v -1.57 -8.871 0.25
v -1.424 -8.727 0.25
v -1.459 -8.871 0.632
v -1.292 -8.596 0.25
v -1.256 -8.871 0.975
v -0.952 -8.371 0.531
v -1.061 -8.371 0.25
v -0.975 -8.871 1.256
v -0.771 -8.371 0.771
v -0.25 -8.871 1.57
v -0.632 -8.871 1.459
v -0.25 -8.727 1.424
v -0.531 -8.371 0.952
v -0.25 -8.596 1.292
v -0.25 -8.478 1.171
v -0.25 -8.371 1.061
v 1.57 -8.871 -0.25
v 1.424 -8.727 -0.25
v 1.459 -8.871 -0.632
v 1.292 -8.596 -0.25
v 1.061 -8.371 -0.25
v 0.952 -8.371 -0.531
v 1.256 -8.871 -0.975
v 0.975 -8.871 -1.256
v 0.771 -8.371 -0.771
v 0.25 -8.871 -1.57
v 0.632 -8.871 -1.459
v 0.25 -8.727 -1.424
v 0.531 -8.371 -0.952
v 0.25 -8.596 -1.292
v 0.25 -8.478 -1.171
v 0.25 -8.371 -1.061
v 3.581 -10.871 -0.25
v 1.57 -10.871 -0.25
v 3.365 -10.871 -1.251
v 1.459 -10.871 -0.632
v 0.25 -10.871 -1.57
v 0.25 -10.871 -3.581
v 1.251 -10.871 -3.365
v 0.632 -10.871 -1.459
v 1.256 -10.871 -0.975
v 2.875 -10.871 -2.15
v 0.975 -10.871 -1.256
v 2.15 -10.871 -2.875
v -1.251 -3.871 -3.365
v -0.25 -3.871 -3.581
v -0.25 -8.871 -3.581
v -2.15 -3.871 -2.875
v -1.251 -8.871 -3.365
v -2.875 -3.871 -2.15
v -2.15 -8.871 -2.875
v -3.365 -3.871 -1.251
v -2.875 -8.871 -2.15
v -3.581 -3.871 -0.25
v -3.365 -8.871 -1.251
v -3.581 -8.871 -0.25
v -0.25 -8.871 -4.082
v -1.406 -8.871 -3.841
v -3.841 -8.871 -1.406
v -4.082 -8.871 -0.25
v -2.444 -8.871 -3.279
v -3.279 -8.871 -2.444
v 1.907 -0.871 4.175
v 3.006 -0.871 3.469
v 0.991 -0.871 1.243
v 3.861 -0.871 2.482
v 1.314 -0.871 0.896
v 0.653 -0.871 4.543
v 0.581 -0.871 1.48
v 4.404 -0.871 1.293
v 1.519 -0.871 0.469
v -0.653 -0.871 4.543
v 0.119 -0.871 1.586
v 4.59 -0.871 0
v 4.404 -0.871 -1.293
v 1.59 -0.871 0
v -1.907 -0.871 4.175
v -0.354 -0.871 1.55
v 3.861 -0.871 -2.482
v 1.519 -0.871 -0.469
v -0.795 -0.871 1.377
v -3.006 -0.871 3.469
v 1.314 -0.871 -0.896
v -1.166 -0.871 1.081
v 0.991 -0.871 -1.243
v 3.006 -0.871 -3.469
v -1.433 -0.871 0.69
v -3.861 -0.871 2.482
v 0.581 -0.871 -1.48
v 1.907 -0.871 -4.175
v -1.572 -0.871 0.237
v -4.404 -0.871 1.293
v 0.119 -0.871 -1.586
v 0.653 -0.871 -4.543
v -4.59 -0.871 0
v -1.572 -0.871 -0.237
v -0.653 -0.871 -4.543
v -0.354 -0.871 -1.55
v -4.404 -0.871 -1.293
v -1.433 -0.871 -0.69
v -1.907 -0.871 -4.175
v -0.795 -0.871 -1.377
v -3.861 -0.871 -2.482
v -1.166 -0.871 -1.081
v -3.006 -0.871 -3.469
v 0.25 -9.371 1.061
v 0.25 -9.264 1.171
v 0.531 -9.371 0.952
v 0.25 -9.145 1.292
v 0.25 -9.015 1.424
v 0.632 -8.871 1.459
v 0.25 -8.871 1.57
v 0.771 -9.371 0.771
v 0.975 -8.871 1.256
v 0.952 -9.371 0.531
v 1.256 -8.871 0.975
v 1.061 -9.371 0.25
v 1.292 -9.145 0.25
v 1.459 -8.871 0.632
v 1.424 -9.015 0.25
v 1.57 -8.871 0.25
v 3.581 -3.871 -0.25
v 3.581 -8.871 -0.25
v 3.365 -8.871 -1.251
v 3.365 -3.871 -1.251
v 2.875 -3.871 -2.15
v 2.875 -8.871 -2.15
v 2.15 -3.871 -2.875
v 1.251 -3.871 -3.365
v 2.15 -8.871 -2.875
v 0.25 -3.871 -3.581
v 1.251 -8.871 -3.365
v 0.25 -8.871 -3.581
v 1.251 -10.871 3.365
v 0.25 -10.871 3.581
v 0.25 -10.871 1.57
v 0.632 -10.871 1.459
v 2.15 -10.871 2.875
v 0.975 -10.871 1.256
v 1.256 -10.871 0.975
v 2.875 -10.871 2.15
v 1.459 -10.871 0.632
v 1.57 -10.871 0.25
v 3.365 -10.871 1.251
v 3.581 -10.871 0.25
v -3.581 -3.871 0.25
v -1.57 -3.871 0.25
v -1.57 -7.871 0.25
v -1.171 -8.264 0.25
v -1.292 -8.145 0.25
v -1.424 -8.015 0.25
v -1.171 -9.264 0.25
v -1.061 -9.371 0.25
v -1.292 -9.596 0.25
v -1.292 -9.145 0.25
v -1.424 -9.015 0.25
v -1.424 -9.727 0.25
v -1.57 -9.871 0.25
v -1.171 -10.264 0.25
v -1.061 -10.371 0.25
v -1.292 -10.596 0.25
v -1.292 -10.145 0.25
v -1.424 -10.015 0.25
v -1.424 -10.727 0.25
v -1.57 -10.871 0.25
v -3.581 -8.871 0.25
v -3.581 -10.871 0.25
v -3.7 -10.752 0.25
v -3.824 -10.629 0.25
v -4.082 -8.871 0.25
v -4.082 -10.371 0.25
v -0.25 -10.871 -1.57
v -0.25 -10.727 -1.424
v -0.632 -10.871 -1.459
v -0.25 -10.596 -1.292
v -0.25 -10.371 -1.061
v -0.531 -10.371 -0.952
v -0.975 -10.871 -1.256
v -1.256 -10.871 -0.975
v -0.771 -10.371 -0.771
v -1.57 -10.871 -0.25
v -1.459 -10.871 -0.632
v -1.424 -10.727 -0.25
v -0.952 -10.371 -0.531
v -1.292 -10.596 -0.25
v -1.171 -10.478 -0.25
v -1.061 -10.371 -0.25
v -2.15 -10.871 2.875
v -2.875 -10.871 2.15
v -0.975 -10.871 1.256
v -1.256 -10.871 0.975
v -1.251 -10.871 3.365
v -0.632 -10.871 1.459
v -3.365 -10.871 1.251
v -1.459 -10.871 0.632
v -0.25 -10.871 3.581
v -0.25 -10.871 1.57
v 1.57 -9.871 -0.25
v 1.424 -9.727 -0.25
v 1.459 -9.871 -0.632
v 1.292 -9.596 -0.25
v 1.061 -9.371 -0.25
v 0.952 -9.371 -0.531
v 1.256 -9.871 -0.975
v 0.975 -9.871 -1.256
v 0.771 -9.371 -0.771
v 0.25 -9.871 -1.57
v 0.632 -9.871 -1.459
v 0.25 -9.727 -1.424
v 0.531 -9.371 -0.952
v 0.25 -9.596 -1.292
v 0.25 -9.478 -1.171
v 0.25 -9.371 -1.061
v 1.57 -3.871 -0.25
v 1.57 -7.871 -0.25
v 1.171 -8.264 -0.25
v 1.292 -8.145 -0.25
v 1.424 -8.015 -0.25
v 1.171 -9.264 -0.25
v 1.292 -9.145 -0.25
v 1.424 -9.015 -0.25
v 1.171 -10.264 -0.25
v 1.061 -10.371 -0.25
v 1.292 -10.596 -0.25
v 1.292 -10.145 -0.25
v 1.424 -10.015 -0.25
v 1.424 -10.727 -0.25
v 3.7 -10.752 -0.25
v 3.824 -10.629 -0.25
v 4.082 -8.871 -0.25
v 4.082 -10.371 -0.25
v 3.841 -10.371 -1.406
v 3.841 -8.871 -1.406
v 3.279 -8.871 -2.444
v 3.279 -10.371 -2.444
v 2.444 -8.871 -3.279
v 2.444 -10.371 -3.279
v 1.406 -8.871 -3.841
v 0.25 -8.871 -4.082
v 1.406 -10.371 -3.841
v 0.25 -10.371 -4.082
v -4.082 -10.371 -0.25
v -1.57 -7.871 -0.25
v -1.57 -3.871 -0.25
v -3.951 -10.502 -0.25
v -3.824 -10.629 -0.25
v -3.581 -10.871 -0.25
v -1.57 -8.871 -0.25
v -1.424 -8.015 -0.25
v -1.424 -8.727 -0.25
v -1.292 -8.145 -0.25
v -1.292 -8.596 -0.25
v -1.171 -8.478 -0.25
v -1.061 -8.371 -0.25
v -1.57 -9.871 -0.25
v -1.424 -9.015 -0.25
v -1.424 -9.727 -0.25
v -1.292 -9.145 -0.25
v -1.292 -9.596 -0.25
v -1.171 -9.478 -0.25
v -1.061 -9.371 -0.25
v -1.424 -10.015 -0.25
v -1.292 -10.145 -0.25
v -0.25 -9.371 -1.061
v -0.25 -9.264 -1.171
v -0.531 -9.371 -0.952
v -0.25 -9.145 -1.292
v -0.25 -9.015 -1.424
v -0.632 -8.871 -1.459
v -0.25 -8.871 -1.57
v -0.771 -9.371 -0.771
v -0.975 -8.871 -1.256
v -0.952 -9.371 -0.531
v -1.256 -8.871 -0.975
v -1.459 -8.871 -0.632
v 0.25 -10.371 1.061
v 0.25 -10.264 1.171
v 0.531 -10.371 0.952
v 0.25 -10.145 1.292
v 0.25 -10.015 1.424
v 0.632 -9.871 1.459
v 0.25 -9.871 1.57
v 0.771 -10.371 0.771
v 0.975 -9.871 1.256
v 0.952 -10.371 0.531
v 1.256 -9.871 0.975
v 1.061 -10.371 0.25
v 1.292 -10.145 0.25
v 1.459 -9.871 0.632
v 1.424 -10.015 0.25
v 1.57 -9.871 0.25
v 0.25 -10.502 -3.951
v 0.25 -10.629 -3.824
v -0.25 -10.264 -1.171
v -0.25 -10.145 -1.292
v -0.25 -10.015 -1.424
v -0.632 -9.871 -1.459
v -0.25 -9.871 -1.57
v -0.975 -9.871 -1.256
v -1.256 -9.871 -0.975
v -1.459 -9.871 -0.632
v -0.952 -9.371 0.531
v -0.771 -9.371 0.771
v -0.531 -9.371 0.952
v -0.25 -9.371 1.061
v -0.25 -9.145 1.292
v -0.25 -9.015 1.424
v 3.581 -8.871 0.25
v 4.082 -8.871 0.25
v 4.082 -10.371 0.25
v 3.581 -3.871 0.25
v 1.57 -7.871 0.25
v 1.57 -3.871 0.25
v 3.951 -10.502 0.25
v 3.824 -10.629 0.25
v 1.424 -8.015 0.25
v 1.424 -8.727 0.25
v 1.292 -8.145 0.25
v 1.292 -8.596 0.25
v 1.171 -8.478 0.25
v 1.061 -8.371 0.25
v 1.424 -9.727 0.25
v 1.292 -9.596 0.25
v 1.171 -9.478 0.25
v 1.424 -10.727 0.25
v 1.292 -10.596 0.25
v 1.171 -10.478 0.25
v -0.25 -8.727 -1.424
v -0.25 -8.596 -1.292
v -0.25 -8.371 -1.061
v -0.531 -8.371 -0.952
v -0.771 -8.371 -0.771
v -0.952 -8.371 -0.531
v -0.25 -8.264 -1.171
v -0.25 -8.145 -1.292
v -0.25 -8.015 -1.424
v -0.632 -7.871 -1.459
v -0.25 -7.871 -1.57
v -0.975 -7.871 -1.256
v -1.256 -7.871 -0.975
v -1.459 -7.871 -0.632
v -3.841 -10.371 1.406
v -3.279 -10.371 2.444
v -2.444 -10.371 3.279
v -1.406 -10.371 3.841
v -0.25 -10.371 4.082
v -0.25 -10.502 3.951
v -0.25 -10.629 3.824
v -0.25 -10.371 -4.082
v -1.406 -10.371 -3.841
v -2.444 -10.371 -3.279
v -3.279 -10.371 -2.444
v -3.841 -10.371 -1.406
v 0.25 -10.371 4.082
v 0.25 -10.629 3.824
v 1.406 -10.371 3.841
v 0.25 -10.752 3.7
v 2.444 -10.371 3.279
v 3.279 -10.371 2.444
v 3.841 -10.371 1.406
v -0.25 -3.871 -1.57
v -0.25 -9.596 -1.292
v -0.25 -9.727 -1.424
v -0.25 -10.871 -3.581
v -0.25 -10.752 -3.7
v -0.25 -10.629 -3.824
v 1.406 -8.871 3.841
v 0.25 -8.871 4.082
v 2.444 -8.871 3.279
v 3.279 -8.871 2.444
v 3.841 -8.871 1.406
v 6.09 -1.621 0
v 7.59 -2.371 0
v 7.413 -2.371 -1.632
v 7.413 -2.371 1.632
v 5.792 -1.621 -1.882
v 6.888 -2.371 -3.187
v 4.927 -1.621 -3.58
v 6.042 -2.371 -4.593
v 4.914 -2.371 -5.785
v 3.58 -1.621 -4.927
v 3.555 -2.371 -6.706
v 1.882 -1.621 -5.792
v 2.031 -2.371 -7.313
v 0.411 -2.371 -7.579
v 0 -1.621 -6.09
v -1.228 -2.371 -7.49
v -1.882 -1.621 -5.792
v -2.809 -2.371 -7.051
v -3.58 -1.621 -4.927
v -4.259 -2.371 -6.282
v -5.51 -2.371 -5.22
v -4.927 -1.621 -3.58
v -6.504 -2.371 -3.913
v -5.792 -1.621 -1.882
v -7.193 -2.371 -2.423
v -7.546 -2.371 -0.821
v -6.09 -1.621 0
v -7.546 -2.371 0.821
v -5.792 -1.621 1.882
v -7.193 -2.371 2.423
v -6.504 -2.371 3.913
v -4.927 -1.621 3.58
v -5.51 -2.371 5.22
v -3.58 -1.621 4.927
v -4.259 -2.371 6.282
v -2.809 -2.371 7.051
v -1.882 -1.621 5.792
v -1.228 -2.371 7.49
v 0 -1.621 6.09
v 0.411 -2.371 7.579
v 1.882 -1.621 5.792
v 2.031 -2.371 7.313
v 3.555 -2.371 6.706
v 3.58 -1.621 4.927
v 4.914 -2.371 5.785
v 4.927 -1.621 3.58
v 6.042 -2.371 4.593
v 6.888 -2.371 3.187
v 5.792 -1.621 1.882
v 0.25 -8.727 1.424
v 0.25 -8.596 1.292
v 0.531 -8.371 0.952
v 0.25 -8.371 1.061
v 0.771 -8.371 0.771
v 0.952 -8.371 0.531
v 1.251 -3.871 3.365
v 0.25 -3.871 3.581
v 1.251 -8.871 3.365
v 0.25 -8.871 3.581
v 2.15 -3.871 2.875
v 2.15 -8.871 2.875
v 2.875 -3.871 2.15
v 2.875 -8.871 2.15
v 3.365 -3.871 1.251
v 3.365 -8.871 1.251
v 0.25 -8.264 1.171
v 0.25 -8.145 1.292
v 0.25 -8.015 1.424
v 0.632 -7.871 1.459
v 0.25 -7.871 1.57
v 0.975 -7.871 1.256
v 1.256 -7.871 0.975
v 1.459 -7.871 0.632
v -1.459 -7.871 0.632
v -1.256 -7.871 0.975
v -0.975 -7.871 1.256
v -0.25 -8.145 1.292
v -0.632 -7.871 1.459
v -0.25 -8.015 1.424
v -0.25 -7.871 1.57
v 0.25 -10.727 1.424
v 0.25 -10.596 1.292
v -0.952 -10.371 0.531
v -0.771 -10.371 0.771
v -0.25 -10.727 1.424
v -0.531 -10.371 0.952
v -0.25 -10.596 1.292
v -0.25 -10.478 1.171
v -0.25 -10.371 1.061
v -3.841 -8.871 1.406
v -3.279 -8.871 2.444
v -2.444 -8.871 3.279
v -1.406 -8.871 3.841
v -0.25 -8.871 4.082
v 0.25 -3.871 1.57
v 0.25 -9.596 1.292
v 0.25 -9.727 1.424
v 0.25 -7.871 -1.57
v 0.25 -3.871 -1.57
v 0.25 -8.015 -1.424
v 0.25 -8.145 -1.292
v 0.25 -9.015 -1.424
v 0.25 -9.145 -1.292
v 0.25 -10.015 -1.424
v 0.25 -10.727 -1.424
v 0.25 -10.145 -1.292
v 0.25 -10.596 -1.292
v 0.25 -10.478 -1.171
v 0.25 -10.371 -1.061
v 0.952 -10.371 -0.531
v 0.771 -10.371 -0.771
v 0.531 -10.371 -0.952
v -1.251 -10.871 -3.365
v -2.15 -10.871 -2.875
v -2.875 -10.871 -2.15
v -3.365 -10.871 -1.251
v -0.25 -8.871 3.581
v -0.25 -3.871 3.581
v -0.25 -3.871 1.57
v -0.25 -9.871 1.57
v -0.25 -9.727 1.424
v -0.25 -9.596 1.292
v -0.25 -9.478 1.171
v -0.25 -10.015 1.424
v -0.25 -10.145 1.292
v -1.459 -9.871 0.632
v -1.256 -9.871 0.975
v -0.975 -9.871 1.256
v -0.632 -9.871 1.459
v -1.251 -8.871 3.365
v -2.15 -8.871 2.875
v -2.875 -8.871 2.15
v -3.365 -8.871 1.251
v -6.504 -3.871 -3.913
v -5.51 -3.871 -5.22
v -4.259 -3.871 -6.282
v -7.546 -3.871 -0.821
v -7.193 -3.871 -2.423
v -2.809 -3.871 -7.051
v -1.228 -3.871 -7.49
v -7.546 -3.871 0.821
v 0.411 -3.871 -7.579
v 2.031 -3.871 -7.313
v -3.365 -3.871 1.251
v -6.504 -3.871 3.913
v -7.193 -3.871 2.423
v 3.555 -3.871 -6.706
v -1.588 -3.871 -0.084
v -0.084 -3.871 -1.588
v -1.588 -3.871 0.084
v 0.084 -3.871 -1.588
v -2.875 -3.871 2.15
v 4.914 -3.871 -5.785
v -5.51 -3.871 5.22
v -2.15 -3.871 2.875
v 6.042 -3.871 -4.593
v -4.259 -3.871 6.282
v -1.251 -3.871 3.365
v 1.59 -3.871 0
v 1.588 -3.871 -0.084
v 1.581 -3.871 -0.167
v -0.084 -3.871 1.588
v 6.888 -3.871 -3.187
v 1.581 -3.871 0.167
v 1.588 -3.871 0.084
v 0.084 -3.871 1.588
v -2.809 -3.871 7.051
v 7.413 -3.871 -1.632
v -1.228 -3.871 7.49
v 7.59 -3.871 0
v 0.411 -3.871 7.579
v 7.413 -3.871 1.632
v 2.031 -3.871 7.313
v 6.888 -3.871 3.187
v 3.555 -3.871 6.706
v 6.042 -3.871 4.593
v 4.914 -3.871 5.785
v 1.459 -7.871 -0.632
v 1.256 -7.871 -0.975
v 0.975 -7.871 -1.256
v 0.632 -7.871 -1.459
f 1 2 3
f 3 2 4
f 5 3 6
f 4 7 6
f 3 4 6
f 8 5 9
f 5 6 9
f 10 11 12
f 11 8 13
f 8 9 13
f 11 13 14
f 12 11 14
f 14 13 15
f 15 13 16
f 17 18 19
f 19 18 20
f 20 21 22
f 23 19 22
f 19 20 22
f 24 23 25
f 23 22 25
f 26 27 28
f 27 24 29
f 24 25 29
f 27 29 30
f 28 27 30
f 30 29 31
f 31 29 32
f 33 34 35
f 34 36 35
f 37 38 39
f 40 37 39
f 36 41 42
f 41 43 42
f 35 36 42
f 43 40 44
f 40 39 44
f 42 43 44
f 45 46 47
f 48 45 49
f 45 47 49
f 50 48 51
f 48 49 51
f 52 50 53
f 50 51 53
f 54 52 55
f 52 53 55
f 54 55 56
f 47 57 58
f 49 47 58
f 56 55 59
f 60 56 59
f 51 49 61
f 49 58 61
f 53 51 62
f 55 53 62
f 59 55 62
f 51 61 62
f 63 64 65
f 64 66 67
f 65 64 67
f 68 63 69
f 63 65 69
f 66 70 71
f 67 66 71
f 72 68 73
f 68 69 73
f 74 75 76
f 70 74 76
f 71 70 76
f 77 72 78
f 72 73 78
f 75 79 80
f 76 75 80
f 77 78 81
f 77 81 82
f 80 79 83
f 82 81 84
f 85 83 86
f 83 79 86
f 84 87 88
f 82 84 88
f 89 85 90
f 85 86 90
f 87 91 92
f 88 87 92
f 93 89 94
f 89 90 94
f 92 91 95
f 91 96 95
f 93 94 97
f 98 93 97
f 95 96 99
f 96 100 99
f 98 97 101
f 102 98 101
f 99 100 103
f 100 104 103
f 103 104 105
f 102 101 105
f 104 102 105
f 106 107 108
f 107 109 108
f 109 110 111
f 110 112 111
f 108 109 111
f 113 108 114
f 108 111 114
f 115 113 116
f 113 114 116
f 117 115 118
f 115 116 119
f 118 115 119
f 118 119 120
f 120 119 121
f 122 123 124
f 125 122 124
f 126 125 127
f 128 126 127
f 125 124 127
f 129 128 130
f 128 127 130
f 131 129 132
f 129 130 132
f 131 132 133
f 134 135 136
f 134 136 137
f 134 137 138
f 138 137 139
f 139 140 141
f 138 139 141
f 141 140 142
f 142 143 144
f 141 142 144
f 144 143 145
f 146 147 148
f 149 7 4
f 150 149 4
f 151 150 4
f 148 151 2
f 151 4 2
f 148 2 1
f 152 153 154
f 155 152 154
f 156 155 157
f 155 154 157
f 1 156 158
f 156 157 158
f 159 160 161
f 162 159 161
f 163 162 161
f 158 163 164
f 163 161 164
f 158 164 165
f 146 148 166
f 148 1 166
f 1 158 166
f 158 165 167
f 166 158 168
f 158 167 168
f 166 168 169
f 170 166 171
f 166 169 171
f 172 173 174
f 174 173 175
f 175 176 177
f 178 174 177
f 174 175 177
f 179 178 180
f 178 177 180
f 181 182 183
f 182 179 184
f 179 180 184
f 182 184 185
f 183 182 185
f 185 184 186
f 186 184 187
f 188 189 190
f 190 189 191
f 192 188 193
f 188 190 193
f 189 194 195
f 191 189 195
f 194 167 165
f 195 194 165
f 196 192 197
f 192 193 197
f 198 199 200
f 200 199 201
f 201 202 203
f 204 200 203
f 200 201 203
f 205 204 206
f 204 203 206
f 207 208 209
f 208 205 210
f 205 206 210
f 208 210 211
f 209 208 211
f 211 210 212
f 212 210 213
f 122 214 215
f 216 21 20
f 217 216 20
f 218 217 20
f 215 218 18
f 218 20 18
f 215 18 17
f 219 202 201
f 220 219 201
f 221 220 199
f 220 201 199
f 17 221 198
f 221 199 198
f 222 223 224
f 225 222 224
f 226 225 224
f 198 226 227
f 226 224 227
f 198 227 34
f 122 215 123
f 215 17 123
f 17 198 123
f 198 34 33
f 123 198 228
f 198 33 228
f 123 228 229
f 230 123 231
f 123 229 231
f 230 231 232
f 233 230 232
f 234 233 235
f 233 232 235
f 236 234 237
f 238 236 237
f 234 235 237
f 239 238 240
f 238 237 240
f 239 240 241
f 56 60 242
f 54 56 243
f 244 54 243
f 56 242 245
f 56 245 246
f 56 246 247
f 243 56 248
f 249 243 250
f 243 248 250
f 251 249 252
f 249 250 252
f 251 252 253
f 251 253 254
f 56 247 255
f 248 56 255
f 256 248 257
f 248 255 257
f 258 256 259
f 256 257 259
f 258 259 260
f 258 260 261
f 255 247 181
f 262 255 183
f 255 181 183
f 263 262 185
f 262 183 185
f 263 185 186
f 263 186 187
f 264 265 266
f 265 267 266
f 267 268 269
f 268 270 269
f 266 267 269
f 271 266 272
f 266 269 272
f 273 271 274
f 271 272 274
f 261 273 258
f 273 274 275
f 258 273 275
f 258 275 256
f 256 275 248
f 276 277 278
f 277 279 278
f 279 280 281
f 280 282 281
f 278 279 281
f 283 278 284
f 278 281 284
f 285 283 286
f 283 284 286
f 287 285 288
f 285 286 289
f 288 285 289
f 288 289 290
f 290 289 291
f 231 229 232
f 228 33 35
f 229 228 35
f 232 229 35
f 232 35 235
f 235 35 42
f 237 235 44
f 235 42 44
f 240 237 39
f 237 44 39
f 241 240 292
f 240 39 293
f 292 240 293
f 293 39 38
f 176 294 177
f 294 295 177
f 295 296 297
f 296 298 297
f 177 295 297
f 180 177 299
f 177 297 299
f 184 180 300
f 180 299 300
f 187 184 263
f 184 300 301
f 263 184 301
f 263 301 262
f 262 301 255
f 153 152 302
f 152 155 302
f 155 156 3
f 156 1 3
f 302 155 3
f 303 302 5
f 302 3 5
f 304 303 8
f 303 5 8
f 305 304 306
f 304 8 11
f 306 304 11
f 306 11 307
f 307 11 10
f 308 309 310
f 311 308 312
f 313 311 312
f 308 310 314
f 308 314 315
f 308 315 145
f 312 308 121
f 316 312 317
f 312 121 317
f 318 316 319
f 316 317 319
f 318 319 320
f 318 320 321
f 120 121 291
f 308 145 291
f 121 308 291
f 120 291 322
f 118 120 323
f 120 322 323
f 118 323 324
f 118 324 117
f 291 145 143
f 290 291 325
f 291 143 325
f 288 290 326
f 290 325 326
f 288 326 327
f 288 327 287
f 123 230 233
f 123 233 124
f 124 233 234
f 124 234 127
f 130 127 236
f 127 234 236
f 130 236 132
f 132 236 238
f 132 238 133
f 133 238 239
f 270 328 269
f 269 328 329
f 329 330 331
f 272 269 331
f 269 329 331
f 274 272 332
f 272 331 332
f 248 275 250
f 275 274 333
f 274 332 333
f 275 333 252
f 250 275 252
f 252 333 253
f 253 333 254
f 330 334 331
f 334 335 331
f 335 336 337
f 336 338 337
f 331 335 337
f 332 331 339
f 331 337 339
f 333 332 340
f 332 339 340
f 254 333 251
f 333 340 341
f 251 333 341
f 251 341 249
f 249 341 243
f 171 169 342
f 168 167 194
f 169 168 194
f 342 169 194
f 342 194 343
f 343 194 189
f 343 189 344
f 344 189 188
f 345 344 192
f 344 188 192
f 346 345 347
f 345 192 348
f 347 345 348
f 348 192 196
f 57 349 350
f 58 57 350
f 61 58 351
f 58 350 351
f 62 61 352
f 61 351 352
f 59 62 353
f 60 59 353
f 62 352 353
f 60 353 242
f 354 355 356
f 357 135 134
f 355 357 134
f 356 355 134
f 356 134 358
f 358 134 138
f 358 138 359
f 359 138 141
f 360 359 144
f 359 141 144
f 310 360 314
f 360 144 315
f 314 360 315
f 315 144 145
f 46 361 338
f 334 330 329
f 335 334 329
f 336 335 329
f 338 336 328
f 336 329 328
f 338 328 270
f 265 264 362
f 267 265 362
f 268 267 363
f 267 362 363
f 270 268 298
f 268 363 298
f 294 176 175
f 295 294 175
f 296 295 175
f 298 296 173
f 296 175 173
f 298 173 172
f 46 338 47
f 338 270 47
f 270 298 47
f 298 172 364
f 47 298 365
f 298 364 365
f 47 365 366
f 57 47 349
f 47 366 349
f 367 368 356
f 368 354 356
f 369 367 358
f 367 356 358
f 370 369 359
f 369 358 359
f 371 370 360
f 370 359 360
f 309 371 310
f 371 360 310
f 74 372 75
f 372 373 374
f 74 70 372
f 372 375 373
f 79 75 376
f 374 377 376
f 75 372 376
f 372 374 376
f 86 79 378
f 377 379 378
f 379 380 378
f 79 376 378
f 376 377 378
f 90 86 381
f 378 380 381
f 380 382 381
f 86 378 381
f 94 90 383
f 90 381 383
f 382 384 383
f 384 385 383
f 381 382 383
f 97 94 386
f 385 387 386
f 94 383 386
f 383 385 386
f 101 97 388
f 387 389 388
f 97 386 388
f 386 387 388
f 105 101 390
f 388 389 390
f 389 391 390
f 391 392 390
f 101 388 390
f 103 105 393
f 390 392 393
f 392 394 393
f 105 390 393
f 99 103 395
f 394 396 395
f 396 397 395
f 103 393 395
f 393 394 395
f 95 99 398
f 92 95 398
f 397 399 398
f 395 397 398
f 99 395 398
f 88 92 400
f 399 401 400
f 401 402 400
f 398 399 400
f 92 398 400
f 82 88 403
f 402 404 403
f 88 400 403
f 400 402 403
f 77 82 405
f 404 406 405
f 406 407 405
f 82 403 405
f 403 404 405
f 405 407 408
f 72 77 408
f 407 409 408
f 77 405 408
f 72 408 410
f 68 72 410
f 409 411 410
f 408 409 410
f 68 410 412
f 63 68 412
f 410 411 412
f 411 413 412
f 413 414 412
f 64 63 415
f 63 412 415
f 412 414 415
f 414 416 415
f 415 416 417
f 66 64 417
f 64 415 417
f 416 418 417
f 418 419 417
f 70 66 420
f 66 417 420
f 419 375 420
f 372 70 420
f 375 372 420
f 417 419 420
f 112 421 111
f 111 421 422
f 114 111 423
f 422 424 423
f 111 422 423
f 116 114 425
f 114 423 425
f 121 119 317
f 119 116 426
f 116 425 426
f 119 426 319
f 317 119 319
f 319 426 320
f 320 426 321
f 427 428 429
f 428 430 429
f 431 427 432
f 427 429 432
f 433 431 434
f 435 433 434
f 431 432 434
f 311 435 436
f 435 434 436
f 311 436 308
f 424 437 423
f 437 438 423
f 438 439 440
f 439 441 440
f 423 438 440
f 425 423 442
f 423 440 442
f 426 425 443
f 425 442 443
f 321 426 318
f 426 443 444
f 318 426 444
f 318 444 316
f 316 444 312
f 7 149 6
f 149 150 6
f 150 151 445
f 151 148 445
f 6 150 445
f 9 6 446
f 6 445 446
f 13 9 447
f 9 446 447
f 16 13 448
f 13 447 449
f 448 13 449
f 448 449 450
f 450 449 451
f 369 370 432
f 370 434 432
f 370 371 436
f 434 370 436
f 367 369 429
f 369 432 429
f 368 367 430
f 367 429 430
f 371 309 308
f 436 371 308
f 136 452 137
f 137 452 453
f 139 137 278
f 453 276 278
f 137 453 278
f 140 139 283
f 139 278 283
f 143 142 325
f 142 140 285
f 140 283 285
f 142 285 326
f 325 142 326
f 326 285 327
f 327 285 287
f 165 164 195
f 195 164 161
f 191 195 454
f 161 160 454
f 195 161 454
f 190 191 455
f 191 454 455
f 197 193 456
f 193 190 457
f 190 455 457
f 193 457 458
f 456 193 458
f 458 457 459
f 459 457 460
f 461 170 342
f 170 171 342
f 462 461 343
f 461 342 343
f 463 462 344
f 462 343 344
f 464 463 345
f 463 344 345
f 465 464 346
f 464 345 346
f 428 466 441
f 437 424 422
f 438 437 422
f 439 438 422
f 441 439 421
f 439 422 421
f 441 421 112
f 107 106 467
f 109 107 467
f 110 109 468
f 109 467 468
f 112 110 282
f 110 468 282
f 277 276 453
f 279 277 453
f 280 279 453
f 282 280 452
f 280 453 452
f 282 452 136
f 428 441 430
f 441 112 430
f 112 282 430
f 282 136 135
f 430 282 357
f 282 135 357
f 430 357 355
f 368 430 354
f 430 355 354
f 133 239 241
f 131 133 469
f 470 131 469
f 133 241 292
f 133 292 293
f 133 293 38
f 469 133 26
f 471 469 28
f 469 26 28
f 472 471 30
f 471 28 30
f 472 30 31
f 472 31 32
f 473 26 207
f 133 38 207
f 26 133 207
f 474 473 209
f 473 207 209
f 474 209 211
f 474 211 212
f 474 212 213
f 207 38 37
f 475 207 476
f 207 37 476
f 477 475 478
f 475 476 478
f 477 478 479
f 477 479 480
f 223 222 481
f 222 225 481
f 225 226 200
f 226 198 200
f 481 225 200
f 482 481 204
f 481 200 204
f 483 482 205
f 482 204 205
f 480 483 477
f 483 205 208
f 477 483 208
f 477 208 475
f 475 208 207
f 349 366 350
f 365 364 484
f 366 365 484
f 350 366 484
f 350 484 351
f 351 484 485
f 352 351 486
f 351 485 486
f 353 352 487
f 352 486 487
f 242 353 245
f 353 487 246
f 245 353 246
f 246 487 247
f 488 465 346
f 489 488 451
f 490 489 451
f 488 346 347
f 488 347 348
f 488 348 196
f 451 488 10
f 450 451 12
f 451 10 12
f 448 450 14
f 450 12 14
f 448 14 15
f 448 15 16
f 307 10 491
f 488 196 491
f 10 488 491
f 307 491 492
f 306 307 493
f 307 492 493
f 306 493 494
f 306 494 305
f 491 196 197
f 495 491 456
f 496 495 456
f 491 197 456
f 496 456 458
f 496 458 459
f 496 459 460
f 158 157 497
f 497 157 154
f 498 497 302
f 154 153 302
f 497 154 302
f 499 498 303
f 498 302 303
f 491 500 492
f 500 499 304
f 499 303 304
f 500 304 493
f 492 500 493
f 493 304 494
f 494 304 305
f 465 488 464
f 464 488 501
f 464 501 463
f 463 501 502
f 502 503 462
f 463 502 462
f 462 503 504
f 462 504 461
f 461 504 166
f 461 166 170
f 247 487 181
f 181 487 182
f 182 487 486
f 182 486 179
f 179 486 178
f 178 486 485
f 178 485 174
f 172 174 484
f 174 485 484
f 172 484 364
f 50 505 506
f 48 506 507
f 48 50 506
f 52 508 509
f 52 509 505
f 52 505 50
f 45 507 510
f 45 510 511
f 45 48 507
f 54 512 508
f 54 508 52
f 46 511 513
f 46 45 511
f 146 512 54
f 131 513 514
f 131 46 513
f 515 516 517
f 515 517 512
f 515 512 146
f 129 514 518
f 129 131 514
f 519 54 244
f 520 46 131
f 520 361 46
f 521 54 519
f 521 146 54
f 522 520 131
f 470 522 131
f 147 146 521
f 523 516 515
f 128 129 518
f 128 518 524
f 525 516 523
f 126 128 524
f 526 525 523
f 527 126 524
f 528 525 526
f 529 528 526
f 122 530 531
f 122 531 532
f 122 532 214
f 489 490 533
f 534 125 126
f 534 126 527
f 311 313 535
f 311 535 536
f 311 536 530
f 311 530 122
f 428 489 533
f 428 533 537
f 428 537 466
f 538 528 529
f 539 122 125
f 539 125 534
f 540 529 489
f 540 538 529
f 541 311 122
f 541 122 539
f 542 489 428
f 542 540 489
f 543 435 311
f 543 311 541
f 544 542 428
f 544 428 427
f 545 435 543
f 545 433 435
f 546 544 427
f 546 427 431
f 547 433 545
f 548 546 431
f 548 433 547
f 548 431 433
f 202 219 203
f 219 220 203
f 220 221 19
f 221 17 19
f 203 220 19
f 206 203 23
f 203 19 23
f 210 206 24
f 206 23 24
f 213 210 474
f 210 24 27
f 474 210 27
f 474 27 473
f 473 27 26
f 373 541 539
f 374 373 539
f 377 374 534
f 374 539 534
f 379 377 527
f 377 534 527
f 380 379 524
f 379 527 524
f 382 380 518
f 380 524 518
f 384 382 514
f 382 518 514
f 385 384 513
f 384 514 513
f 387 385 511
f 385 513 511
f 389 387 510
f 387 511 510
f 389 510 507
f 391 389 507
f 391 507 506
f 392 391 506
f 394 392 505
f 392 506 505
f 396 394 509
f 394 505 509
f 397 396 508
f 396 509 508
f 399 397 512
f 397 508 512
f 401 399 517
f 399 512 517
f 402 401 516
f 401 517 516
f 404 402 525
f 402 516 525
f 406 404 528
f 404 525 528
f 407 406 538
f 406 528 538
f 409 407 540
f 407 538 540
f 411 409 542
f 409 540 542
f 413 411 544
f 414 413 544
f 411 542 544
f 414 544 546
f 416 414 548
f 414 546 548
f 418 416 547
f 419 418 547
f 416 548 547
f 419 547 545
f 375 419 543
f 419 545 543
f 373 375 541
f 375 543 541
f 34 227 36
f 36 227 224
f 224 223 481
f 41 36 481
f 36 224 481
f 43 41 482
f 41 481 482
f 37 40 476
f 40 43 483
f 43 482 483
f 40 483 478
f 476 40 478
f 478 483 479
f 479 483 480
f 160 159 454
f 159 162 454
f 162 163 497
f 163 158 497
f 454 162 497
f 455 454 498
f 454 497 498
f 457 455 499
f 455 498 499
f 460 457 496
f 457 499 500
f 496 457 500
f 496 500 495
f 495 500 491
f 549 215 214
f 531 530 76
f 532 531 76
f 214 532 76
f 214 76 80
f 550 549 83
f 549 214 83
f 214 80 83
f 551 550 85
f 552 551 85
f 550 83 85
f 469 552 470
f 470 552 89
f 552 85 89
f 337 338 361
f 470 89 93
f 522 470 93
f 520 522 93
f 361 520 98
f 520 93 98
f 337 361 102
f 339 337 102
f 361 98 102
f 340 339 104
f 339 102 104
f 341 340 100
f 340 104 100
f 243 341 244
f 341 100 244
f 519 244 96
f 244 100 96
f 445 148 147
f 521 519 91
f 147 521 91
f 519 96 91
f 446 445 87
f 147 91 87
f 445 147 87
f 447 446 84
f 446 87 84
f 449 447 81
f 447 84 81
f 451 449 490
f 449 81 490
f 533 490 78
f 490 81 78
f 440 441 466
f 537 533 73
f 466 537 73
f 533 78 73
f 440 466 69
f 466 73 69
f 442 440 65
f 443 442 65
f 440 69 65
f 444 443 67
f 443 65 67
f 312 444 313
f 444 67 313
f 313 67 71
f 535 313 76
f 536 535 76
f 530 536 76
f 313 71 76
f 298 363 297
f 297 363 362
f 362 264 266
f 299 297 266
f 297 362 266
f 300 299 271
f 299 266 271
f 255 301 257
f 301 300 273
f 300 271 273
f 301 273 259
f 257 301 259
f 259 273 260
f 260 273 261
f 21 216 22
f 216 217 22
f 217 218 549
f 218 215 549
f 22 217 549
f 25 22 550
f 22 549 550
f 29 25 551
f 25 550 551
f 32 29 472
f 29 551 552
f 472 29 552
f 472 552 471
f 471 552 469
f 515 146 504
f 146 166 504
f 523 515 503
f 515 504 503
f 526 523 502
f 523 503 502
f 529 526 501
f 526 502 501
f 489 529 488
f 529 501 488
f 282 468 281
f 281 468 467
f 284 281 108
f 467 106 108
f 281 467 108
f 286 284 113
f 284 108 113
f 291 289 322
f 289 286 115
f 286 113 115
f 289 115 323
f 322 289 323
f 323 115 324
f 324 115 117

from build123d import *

# Parameters (mm, degrees)
ENL_V_MAT_EXTRU_2_DEPTH = 7


with BuildPart() as part:
    # Esquisse1 → Révolution1 (revolve)
    with BuildSketch(Plane.XY):
        Polygon((1.59, -0.870821866), (4.59, -0.870821866), (7.59, -2.370821866), (7.59, -3.870821866), (3.59, -3.870821866), (3.59, -8.870821866), (4.09, -8.870821866), (4.09, -10.370821866), (3.59, -10.870821866), (1.59, -10.870821866), (1.09, -10.370821866), (1.59, -9.870821866), (1.09, -9.370821866), (1.59, -8.870821866), (1.09, -8.370821866), (1.59, -7.870821866), align=None)
    revolve(axis=Axis((0, 0, 0), (0, 1, 0)))

    # Esquisse4 → Enlèv. mat.-Extru.2 (cut)
    with BuildSketch(Plane.XZ.offset(10.870821866)):
        Polygon((-0.25, 0.25), (-6.93889881, 0.25), (-6.93889881, -0.25), (-0.25, -0.25), (-0.25, -5.58524478), (0.25, -5.58524478), (0.25, -0.25), (11.352493463, -0.25), (11.352493463, 0.25), (0.25, 0.25), (0.25, 5.858250635), (-0.25, 5.858250635), align=None)
    extrude(amount=-ENL_V_MAT_EXTRU_2_DEPTH, mode=Mode.SUBTRACT)


solid = part.part
